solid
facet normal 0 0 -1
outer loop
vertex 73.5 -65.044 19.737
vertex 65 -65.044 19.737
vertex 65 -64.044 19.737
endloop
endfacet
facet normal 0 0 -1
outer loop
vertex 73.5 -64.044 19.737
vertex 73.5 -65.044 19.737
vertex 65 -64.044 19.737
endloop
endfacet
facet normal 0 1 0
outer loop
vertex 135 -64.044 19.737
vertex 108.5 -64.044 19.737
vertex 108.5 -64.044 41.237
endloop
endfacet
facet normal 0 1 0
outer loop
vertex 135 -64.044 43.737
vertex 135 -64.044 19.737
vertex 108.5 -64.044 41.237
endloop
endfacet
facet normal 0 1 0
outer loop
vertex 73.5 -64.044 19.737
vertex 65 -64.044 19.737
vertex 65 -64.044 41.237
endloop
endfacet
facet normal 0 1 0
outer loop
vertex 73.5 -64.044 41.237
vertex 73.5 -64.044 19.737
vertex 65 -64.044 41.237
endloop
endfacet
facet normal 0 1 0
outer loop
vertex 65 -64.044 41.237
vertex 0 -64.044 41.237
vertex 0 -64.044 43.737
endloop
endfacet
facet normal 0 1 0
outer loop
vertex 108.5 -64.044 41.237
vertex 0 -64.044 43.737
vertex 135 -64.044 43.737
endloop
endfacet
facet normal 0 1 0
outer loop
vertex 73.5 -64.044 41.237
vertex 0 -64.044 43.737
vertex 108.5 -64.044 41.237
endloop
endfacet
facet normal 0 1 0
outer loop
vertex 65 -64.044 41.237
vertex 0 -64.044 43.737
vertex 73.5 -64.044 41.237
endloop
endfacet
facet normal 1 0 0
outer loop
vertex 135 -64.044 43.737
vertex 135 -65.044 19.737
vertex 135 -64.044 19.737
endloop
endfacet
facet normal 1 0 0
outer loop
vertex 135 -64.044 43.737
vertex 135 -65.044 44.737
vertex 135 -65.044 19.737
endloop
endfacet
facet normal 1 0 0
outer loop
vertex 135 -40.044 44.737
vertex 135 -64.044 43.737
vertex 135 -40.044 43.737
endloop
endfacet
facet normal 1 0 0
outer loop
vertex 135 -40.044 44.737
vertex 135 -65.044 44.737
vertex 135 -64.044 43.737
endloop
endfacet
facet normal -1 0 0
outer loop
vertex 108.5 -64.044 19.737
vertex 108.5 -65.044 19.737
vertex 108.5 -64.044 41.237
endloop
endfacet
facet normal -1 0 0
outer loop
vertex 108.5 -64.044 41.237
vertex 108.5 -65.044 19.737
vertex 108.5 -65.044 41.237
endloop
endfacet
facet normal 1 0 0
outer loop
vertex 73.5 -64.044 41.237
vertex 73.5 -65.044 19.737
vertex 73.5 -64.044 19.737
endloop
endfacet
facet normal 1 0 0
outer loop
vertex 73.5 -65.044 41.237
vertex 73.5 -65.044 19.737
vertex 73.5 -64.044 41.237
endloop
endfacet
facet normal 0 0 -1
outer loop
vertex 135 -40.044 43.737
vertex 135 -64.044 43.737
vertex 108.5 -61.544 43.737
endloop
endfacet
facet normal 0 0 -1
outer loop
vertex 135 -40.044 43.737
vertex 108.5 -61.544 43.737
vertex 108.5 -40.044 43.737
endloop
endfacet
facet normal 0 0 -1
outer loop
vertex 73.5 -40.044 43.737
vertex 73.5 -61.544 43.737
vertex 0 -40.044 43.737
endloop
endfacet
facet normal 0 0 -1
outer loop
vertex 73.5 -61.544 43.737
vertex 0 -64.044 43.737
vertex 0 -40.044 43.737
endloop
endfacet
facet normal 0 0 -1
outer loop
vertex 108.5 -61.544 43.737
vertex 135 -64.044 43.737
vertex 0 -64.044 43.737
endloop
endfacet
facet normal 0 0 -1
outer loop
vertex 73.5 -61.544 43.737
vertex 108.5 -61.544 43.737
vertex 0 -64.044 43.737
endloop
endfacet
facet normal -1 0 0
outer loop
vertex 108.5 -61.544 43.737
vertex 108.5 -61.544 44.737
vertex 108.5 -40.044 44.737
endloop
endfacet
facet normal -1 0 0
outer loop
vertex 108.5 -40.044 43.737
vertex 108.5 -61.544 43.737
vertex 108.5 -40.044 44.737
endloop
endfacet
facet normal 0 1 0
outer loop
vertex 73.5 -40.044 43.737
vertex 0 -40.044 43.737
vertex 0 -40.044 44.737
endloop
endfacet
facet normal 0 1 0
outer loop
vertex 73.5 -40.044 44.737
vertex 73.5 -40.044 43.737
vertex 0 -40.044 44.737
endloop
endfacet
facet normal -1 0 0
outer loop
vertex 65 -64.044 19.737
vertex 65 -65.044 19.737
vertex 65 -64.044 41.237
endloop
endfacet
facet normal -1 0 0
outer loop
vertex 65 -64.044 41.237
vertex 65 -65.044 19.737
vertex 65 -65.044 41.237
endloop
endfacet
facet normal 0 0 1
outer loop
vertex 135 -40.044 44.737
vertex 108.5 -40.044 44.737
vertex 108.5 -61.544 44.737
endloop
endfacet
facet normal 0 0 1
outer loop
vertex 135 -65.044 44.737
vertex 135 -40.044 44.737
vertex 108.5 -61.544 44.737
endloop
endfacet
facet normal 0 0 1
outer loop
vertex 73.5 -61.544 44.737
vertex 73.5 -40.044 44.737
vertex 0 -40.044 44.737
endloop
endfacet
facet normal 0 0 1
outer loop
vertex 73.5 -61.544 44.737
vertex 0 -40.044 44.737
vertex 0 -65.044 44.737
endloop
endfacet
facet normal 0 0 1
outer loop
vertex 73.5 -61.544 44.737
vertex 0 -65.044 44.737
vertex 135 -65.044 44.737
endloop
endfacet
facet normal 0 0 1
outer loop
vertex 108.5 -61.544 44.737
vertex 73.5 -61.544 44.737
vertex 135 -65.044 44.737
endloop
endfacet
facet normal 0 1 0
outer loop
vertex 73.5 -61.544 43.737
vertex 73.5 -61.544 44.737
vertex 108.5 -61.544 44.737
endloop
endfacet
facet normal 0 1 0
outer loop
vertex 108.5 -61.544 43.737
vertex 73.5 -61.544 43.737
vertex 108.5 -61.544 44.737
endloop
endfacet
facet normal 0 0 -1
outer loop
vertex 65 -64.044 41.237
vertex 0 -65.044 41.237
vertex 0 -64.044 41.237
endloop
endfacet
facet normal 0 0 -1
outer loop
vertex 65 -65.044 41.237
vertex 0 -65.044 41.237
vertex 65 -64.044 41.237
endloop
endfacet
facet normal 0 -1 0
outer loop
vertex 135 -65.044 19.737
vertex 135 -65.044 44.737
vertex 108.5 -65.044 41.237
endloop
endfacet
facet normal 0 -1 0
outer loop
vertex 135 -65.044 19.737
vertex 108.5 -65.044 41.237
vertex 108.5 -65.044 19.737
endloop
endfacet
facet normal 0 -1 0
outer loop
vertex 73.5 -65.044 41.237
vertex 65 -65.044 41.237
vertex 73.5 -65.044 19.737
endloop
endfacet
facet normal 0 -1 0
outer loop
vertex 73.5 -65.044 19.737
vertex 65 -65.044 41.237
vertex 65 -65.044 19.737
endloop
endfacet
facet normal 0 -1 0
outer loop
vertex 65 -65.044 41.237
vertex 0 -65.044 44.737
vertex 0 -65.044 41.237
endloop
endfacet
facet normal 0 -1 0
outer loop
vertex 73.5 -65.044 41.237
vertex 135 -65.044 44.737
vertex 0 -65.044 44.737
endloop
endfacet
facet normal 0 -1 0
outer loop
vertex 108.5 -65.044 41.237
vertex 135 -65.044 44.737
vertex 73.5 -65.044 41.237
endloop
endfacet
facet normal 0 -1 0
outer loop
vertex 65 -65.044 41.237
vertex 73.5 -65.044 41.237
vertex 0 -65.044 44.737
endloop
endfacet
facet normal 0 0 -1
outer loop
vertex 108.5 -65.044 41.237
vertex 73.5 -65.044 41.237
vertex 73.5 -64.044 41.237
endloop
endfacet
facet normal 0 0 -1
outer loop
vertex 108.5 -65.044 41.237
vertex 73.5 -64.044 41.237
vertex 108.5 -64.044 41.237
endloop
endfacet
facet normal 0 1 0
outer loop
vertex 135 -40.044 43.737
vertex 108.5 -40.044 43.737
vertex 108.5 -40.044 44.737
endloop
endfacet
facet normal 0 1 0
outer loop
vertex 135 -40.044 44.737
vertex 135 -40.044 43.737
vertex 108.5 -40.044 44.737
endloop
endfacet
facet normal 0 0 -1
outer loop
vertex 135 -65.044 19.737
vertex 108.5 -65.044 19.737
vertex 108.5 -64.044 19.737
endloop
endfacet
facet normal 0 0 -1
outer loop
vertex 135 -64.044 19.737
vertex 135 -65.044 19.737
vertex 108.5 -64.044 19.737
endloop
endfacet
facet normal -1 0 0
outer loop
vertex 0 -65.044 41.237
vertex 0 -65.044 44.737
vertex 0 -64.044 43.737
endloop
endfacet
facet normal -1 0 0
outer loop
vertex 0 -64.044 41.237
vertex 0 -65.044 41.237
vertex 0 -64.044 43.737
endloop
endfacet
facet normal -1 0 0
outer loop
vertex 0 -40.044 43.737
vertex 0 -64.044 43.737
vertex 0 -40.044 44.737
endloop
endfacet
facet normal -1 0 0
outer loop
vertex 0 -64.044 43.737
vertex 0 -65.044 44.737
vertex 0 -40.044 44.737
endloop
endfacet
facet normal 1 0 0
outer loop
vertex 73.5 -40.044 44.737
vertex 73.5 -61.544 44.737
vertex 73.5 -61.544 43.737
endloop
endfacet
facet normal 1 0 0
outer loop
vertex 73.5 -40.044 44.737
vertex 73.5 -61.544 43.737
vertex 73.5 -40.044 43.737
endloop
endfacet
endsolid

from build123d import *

# Parameters (mm, degrees)
F0_W     = 1
F0_H     = 24
F0_H_2   = 1
F0_W_2   = 24
F1_DEPTH = 135
F2_W     = 35
F2_H     = 21.5
F3_DEPTH = 1
F4_W     = 35
F4_H     = 21.5
F4_W_2   = 65
F5_DEPTH = 1


with BuildPart() as f1:
    # F0 (on Right) → F1 (new body)
    with BuildSketch(Plane.YZ):
        with Locations((-64.544081, 31.736633)):
            Rectangle(F0_W, F0_H)
        with Locations((-64.544081, 44.236633)):
            Rectangle(F0_W, F0_H_2)
        with Locations((-52.044081, 44.236633)):
            Rectangle(F0_W_2, F0_H_2)
    extrude(amount=F1_DEPTH)

    # F2 (on face) → F3 (cut)
    with BuildSketch(Plane.XY.offset(44.736633)):
        with Locations((91, -50.794081)):
            Rectangle(F2_W, F2_H)
    extrude(amount=-F3_DEPTH, mode=Mode.SUBTRACT)

    # F4 (on face) → F5 (cut)
    with BuildSketch(Plane.XZ.offset(65.044081)):
        with Locations((91, 30.486633)):
            Rectangle(F4_W, F4_H)
        with Locations((32.5, 30.486633)):
            Rectangle(F4_W_2, F4_H)
    extrude(amount=-F5_DEPTH, mode=Mode.SUBTRACT)


solid = f1.part
